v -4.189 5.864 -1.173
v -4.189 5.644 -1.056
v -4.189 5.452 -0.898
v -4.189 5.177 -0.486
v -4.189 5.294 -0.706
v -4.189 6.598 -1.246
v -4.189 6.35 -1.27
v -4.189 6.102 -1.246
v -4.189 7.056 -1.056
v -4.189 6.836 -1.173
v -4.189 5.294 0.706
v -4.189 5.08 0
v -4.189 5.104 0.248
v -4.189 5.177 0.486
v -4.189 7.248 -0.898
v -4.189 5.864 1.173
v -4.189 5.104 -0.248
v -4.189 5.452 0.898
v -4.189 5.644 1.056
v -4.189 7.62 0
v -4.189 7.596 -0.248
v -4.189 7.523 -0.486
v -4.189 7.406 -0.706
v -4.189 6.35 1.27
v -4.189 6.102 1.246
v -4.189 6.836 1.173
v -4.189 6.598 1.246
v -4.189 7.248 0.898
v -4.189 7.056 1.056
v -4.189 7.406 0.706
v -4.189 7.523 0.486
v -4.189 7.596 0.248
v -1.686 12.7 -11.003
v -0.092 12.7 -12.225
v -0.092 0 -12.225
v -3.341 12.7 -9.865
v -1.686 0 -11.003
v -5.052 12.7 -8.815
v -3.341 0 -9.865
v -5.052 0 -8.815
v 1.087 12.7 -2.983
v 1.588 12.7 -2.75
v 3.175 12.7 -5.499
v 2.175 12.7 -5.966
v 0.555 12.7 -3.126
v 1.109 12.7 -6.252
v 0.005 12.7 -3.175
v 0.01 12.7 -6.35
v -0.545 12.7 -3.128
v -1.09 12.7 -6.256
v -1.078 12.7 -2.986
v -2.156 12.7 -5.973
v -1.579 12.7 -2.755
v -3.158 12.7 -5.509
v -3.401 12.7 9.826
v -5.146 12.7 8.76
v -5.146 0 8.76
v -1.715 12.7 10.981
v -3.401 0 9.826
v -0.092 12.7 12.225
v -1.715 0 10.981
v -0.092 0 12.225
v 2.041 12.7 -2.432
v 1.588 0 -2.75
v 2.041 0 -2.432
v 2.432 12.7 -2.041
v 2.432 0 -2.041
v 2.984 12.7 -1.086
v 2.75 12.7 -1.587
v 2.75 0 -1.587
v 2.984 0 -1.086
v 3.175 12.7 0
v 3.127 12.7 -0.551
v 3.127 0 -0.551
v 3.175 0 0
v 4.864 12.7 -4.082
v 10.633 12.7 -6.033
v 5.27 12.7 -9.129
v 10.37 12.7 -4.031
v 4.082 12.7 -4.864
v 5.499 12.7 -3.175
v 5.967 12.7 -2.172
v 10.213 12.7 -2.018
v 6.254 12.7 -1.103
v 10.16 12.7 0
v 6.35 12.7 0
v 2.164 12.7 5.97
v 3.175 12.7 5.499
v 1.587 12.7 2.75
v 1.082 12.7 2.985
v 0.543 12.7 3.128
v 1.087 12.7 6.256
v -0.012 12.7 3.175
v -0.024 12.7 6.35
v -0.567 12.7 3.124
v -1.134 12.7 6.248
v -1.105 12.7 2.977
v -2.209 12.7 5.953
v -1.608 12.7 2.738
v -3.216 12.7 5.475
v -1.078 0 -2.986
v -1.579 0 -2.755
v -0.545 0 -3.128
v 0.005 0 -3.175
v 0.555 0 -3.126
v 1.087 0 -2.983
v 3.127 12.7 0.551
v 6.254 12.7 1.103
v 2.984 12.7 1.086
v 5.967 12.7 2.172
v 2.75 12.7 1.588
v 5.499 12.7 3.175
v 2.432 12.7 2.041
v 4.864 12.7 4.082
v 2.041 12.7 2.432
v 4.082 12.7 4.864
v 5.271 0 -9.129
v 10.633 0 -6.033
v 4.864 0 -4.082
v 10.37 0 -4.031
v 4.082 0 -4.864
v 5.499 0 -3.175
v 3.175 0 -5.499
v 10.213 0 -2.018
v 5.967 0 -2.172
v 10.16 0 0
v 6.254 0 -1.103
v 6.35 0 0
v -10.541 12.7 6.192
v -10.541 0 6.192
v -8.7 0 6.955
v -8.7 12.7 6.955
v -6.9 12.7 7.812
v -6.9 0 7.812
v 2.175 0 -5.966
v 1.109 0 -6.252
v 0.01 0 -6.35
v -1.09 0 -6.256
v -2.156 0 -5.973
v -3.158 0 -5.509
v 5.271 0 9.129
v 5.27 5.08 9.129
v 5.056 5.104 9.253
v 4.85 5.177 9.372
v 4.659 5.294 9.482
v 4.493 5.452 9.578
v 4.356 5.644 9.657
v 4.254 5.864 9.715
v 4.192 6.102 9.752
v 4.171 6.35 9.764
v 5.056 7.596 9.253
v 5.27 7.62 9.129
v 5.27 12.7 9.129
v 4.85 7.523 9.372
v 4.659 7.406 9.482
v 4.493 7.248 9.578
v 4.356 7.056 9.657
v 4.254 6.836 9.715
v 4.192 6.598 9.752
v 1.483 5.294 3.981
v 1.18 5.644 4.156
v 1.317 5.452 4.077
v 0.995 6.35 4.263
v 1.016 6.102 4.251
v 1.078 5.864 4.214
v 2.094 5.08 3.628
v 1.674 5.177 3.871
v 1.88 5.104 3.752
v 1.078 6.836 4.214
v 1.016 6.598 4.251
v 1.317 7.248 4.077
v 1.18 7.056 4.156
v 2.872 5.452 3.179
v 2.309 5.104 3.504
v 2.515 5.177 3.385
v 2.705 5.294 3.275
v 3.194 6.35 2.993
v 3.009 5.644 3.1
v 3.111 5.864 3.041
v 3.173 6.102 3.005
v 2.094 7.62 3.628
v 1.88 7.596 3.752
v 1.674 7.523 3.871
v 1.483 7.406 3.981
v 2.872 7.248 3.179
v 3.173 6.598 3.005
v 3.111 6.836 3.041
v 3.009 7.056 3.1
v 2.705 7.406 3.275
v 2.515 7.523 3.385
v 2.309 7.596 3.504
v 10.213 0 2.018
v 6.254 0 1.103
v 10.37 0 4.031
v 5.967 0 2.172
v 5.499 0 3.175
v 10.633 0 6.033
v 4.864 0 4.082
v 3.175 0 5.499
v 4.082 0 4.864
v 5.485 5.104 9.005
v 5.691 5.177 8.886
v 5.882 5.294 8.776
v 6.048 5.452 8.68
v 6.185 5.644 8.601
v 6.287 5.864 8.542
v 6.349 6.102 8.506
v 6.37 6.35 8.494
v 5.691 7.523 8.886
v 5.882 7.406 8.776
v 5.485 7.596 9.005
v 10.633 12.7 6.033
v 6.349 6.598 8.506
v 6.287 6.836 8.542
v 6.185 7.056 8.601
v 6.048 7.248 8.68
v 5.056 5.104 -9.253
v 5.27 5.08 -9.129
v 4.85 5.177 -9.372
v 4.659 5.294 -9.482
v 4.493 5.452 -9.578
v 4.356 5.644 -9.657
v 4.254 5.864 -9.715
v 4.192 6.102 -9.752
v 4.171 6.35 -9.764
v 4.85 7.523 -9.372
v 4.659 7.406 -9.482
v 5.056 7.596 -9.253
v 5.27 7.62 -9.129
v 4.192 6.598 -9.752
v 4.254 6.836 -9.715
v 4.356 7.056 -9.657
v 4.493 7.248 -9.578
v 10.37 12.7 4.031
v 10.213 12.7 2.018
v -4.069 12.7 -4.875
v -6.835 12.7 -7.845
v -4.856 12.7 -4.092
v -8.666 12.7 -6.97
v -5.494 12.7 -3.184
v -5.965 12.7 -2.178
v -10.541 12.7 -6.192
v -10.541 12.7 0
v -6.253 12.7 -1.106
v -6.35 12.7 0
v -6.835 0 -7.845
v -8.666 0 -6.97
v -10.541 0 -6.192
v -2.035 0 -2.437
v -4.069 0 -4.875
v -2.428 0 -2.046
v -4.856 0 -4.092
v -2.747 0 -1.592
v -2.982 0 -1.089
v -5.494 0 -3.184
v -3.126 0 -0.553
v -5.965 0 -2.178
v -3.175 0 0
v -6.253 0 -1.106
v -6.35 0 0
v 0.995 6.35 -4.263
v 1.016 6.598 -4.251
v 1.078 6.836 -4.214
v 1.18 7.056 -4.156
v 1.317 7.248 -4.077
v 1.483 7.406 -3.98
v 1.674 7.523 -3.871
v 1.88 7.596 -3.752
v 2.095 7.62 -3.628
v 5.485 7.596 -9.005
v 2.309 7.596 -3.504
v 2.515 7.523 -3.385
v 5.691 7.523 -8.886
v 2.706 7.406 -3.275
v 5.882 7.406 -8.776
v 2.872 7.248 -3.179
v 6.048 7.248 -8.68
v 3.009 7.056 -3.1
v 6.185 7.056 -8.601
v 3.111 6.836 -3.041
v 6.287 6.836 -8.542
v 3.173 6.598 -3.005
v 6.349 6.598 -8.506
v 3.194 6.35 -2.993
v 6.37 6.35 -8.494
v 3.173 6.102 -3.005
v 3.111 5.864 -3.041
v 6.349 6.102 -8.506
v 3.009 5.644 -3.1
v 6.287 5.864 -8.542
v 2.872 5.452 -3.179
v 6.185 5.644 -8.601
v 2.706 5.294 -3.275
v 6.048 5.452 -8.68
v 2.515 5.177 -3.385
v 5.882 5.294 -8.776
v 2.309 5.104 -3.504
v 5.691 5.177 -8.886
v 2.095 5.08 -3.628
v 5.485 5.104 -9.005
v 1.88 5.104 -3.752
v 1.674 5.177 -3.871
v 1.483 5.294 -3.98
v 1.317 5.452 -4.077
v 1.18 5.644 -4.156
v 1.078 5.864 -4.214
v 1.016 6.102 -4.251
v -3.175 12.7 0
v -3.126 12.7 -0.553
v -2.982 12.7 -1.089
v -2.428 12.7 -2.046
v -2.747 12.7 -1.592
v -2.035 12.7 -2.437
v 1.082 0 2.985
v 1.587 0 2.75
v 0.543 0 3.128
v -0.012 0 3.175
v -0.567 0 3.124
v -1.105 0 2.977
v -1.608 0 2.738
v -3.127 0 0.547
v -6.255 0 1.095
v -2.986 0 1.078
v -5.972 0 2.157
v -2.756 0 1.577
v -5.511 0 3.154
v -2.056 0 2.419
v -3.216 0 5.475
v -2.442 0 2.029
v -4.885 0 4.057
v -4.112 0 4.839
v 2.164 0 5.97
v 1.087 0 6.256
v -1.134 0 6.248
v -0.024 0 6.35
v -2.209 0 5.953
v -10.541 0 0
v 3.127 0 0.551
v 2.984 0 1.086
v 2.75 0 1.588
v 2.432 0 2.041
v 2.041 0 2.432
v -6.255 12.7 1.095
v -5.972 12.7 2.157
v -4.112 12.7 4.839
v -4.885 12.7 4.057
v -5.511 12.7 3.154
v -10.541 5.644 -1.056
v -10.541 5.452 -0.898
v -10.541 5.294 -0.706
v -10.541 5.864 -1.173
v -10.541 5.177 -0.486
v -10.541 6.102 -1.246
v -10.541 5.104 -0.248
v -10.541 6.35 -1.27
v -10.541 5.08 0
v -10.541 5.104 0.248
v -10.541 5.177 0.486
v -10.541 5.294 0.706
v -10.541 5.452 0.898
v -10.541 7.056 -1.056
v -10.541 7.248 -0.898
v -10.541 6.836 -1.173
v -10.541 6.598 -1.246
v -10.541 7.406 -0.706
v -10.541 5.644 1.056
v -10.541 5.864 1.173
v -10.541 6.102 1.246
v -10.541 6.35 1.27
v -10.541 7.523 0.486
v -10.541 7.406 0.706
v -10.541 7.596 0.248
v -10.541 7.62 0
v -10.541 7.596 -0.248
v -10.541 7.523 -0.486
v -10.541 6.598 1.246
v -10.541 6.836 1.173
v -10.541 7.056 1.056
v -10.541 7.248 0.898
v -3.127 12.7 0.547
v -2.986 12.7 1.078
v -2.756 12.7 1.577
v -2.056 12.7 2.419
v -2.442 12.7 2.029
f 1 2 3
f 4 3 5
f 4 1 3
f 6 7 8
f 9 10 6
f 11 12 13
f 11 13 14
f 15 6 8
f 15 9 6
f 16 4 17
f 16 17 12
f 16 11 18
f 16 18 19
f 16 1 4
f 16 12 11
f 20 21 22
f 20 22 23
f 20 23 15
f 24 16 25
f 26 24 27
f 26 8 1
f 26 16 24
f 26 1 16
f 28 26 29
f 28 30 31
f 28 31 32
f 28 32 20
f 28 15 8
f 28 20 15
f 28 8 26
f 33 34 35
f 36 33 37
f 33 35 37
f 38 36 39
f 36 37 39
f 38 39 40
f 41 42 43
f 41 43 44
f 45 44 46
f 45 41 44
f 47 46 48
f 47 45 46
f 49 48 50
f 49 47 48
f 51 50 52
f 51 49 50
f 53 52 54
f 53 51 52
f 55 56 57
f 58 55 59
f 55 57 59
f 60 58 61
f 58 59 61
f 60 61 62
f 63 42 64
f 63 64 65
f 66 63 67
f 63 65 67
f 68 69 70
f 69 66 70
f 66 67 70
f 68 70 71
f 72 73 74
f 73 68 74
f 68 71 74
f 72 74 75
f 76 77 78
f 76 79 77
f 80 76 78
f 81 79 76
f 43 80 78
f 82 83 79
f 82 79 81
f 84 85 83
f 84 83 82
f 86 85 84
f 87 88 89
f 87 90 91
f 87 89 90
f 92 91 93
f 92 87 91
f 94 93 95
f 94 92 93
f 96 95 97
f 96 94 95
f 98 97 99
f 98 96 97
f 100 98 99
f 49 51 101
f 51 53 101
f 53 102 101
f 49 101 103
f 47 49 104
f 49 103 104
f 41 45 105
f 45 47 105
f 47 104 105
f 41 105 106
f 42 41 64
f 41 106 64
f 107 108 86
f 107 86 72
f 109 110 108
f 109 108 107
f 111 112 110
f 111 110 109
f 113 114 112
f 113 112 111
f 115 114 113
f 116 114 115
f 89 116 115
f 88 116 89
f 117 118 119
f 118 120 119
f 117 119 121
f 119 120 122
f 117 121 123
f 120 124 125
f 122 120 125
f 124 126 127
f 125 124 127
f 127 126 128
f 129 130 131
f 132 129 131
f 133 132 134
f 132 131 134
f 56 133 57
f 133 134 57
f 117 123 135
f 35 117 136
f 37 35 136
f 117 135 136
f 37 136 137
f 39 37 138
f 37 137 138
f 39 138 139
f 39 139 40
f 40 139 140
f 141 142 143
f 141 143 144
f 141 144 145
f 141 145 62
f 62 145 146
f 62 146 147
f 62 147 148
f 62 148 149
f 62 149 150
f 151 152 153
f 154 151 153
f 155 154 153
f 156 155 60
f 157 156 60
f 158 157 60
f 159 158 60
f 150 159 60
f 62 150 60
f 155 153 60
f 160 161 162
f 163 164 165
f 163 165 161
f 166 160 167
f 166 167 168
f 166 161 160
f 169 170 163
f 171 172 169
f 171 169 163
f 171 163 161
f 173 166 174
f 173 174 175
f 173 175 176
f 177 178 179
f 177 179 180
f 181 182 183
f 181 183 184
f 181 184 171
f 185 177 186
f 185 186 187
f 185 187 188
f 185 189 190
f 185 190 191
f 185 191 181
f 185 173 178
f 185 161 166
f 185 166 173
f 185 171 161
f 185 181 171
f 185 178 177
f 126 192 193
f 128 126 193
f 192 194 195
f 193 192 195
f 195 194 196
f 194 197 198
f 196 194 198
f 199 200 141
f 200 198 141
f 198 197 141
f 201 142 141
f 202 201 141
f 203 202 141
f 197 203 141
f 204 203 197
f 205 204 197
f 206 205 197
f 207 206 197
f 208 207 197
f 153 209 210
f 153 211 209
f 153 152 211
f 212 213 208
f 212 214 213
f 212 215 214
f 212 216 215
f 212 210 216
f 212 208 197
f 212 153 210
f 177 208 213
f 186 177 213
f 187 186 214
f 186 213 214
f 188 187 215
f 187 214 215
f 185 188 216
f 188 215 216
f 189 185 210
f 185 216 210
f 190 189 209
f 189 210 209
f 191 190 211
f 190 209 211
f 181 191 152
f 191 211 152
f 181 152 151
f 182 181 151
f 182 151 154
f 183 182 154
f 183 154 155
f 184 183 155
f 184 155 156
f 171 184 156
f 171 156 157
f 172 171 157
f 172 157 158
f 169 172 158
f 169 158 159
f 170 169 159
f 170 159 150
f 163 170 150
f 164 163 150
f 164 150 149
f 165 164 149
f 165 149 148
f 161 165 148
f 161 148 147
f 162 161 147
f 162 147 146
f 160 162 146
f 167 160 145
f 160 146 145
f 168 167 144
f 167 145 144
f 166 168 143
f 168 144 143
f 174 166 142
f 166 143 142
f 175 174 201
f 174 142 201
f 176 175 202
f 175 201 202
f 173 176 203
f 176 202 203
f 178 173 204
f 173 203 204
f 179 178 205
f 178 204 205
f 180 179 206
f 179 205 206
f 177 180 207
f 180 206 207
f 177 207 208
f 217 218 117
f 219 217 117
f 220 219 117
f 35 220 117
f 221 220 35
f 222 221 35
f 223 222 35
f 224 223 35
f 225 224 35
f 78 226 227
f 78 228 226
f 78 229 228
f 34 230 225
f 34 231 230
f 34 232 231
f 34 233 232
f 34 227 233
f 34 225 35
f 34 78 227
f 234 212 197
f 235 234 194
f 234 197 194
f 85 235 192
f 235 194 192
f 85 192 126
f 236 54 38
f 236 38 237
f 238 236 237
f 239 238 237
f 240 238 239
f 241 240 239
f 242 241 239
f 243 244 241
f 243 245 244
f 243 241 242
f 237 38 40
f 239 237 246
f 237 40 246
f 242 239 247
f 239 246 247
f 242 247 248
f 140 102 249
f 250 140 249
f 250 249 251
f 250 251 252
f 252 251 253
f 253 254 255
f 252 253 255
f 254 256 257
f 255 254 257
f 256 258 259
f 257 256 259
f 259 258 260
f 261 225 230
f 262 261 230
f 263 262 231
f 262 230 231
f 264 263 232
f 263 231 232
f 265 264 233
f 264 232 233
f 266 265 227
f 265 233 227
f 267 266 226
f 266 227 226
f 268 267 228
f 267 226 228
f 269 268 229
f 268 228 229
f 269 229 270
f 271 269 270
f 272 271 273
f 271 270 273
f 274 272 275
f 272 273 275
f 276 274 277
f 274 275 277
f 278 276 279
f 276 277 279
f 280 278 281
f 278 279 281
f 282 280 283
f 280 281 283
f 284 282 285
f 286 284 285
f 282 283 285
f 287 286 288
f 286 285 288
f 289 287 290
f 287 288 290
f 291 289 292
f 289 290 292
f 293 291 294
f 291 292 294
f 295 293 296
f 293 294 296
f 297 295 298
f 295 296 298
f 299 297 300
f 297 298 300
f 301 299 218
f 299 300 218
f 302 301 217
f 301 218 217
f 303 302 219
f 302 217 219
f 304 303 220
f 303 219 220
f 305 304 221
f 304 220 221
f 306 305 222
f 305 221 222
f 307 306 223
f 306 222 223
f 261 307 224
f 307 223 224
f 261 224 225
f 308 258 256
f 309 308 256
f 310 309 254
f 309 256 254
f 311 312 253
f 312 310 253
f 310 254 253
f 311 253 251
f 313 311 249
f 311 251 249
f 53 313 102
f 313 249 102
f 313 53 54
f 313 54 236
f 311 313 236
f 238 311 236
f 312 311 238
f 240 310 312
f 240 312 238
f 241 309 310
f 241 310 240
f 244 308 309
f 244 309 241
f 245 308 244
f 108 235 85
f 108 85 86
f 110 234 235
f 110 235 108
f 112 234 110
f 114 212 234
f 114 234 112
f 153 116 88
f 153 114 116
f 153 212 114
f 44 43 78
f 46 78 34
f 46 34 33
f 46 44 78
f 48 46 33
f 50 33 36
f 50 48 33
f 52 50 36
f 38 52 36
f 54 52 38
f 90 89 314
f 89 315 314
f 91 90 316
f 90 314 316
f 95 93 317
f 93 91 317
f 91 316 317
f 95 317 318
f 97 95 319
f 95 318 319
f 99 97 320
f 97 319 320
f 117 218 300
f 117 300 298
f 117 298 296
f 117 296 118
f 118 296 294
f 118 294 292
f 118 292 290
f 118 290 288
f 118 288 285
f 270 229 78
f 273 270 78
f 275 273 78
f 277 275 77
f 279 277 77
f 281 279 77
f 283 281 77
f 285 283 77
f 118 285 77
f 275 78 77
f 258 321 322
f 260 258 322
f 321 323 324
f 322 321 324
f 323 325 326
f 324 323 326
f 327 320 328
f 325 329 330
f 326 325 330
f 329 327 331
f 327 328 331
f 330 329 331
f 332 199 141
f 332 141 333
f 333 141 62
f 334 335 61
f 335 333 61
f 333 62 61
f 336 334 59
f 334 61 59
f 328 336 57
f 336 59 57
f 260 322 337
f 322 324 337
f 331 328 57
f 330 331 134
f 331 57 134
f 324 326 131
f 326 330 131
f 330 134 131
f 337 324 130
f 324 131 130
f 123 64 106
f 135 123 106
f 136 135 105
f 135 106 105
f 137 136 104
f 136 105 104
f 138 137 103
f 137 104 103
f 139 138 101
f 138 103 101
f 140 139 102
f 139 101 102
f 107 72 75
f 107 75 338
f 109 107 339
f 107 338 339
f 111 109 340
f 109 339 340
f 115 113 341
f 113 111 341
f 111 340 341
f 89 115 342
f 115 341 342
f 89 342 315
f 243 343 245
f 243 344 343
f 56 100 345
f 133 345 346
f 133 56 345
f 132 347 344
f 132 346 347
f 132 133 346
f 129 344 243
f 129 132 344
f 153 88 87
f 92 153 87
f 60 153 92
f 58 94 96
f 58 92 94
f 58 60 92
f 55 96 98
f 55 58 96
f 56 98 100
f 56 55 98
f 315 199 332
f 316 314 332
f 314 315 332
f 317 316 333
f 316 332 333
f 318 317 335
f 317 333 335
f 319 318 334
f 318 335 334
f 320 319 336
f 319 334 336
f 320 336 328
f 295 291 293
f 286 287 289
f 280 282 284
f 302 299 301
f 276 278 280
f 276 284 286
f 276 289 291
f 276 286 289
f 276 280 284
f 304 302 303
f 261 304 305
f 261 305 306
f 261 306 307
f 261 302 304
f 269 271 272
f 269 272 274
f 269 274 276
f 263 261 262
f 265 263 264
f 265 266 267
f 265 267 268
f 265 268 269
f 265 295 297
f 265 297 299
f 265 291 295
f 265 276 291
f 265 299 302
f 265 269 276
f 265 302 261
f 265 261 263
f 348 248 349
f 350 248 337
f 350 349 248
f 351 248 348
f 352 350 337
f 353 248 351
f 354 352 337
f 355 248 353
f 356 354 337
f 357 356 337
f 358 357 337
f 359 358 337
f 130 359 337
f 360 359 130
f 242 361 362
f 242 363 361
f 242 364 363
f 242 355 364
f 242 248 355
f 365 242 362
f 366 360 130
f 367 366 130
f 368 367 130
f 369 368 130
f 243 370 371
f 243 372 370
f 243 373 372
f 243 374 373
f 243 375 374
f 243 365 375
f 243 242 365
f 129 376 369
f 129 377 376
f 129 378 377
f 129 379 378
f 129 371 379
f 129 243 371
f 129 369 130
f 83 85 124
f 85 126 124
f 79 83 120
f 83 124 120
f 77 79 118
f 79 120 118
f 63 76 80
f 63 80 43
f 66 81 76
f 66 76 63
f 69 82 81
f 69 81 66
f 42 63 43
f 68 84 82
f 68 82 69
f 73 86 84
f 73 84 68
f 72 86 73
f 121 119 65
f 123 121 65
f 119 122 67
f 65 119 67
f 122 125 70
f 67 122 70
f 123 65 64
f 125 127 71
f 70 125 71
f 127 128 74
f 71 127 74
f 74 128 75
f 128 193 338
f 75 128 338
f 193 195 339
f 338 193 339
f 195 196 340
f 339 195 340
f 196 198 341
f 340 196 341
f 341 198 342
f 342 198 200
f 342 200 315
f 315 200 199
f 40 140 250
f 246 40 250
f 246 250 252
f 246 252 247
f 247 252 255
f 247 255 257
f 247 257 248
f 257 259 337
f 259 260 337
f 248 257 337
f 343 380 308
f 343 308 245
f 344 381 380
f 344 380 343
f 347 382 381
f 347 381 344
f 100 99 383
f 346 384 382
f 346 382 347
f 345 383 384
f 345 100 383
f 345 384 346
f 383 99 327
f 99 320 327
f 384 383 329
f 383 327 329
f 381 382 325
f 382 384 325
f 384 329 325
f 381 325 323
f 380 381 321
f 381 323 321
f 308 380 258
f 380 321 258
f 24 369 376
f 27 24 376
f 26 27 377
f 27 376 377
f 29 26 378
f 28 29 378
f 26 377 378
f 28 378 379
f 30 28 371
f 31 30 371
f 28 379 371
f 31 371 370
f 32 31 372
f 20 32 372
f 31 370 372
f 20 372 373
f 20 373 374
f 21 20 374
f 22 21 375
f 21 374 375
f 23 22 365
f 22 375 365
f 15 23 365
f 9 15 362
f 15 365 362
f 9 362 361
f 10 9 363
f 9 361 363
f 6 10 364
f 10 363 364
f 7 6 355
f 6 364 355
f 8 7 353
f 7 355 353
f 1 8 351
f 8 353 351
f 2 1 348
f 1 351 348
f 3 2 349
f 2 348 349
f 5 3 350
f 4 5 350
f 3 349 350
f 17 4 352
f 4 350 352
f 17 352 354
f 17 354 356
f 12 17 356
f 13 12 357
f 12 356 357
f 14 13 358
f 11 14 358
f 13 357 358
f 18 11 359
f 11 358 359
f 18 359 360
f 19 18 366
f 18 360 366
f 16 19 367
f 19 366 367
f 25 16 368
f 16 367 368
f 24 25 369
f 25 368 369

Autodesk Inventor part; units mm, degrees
ref_plane "YZ Plane" through (0, 0, 0) normal (1, 0, 0) x (0, 1, 0)
ref_plane "XZ Plane" through (0, 0, 0) normal (0, 1, 0) x (-1, 0, 0)
ref_plane "XY Plane" through (0, 0, 0) normal (0, 0, 1) x (1, 0, 0)
sketch "Sketch1" plane through (0, 0, 0) normal (0, 1, 0) x (-1, 0, 0)
  line L0 (0, 0) -> (28.575, 0)
  line L1 (28.575, 0) -> (0, 0)
  line L2 (0, 0) -> (-14.2875, -24.7467)
  line L3 (0, 0) -> (28.575, 0) construction
  line L4 (0, 0) -> (-14.2875, 24.7467)
  line L5 (0, 0) -> (28.575, 0) construction
  circle A0 centre (28.575, 0) radius 2.54
  circle A1 centre (-14.2875, -24.7467) radius 2.54
  circle A2 centre (-14.2875, 24.7467) radius 2.54
  circle A3 centre (0, 0) radius 3.175
  circle A4 centre (0, 0) radius 6.35
  line L6 (-1.5875, -2.7496) -> (0, 0)
  line L7 (0, 0) -> (-6.35, 0)
  circle A5 centre (-14.2875, 24.7467) radius 3.81
  circle A6 centre (28.575, 0) radius 3.81
  circle A7 centre (-14.2875, -24.7467) radius 3.81
  line L8 (30.6811, 3.175) -> (-12.1814, 27.9217)
  line L9 (28.2054, -3.792) -> (-10.8187, -26.3226)
  line L10 (-18.0975, 24.7467) -> (-18.0975, -24.7467)
  line L11 (0, 0) -> (5.0525, -8.8146)
  line L12 (0, 0) -> (5.1463, 8.7602)
  line L13 (0, 0) -> (-10.16, 0)
  arc A8 (28.2054, -3.792) -> (-10.8187, -26.3226) centre (24.4473, -42.344) ccw
  arc A9 (-10.8187, 26.3226) -> (28.2054, 3.792) centre (24.4473, 42.344) ccw
  arc A10 (-17.3867, -22.5305) -> (-17.3867, 22.5305) centre (-48.8947, 0) ccw
  point P0 (5.1074, 8.7829)
  point P1 (-10.16, 0.0317)
  point P2 (30.2716, 3.4114)
  point P3 (28.2054, 3.792)
  point P4 (-10.8187, 26.3226)
  point P5 (-17.3867, 22.5305)
  point P6 (-17.3867, -22.5305)
  dimension "d9" = 6.35
  dimension "d41" = 12.7
  dimension "d0" = 28.575
  dimension "d1" = 28.575
  dimension "d2" = 120
  dimension "d3" = 28.575
  dimension "d4" = 120
  dimension "d5" = 5.08
  dimension "d6" = 5.08
  dimension "d7" = 5.08
  dimension "d42" = 7.62
  dimension "d43" = 7.62
  dimension "d44" = 7.62
  dimension "d47" = 10.16
  dimension "d48" = 10.16
  dimension "d49" = 10.16
  dimension "d52" = 360
extrude "Extrusion4" add sketch "Sketch1" along normal blind 12.7 contours A3 L12 A4 L0 | L0 A4 L11 A3 | A3 L11 A4 L2 | L2 A4 L7 A3 | A3 L7 A4 L4 | L4 A4 L12 A3 | A4 L12 A9 A6 L0 | L0 A6 A8 L11 A4 | A4 L11 A8 A7 L2 | L2 A7 A10 L13 A4 | A4 L13 A10 A5 L4 | L4 A5 A9 L12 A4 | A6 L8 | A7 | A5 picked at (31.8987, 0.5122)
sketch "Sketch15" plane through (0, 12.7, 0) normal (0, 1, 0) x (1, 0, 0)
  circle A0 centre (-28.575, 0) radius 2.54 projected
  line L0 (-28.575, 0) -> (-10.541, 0)
  circle A1 centre (14.2875, 24.7467) radius 2.54 projected
  circle A2 centre (14.2875, -24.7467) radius 2.54 projected
  line L1 (14.2875, -24.7467) -> (5.2705, -9.1288)
  line L2 (14.2875, 24.7467) -> (5.2705, 9.1288)
  line L3 (-10.541, 0) -> (-10.541, 6.1917)
  arc A3 (-28.2054, 3.792) -> (10.8187, 26.3226) centre (-24.4473, 42.344) ccw projected
  line L4 (-10.541, 0) -> (-10.541, -6.1917)
  arc A4 (10.8187, -26.3226) -> (-28.2054, -3.792) centre (-24.4473, -42.344) ccw projected
  arc A5 (17.3867, 22.5305) -> (17.3867, -22.5305) centre (48.8947, 0) ccw projected
  line L5 (5.2705, -9.1288) -> (10.6326, -6.0329)
  line L6 (5.2705, -9.1288) -> (-0.0916, -12.2246)
  line L7 (5.2705, 9.1288) -> (-0.0916, 12.2246)
  line L8 (5.2705, 9.1288) -> (10.6326, 6.0329)
  arc A6 (10.8187, -26.3226) -> (17.3867, -22.5305) centre (14.2875, -24.7467) ccw projected
  arc A7 (17.3867, 22.5305) -> (10.8187, 26.3226) centre (14.2875, 24.7467) ccw projected
  arc A8 (-28.2054, 3.792) -> (-30.6811, -3.175) centre (-28.575, 0) ccw projected
  line L9 (-30.6811, -3.175) -> (-30.2716, -3.4114) projected
  arc A9 (-30.2716, -3.4114) -> (-28.2054, -3.792) centre (-28.575, 0) ccw projected
  point P0 (0, 0)
  dimension "d91" = 18.034
  dimension "d92" = 18.034
  dimension "d93" = 18.034
extrude "Extrusion7" cut sketch "Sketch15" against normal blind 25.4 contours L4 A4 A9 L9 A8 A3 L3 | A3 A7 A5 L8 L7 | L6 L5 A5 A6 A4
sketch "Sketch16" plane through (10.6326, 0, 6.0329) normal (0.5, 0, 0.8660254) x (0.8660254, 0, -0.5)
  line L0 (-9.3667, 12.7) -> (-3.0167, 12.7) projected
  line L1 (-6.1917, 12.7) -> (-6.1917, 0)
  line L2 (-12.3833, 0) -> (-12.3833, 12.7) projected
  line L3 (-12.3833, 6.35) -> (0, 6.35)
  line L4 (0, 12.7) -> (0, 0) projected
  circle A0 centre (-6.1917, 6.35) radius 1.27
  dimension "d96" = 2.54
extrude "Extrusion8" cut sketch "Sketch16" against normal blind 6.35
thread "Thread1" size "M2.6x0.45" class "6H" standard "ISO Metric profile" full length
pattern_circular "Circular Pattern1" count 3 over 360 about axis through (0, 0, 0) along (0, 1, 0) of "Extrusion8"
properties part number "stability copy"
